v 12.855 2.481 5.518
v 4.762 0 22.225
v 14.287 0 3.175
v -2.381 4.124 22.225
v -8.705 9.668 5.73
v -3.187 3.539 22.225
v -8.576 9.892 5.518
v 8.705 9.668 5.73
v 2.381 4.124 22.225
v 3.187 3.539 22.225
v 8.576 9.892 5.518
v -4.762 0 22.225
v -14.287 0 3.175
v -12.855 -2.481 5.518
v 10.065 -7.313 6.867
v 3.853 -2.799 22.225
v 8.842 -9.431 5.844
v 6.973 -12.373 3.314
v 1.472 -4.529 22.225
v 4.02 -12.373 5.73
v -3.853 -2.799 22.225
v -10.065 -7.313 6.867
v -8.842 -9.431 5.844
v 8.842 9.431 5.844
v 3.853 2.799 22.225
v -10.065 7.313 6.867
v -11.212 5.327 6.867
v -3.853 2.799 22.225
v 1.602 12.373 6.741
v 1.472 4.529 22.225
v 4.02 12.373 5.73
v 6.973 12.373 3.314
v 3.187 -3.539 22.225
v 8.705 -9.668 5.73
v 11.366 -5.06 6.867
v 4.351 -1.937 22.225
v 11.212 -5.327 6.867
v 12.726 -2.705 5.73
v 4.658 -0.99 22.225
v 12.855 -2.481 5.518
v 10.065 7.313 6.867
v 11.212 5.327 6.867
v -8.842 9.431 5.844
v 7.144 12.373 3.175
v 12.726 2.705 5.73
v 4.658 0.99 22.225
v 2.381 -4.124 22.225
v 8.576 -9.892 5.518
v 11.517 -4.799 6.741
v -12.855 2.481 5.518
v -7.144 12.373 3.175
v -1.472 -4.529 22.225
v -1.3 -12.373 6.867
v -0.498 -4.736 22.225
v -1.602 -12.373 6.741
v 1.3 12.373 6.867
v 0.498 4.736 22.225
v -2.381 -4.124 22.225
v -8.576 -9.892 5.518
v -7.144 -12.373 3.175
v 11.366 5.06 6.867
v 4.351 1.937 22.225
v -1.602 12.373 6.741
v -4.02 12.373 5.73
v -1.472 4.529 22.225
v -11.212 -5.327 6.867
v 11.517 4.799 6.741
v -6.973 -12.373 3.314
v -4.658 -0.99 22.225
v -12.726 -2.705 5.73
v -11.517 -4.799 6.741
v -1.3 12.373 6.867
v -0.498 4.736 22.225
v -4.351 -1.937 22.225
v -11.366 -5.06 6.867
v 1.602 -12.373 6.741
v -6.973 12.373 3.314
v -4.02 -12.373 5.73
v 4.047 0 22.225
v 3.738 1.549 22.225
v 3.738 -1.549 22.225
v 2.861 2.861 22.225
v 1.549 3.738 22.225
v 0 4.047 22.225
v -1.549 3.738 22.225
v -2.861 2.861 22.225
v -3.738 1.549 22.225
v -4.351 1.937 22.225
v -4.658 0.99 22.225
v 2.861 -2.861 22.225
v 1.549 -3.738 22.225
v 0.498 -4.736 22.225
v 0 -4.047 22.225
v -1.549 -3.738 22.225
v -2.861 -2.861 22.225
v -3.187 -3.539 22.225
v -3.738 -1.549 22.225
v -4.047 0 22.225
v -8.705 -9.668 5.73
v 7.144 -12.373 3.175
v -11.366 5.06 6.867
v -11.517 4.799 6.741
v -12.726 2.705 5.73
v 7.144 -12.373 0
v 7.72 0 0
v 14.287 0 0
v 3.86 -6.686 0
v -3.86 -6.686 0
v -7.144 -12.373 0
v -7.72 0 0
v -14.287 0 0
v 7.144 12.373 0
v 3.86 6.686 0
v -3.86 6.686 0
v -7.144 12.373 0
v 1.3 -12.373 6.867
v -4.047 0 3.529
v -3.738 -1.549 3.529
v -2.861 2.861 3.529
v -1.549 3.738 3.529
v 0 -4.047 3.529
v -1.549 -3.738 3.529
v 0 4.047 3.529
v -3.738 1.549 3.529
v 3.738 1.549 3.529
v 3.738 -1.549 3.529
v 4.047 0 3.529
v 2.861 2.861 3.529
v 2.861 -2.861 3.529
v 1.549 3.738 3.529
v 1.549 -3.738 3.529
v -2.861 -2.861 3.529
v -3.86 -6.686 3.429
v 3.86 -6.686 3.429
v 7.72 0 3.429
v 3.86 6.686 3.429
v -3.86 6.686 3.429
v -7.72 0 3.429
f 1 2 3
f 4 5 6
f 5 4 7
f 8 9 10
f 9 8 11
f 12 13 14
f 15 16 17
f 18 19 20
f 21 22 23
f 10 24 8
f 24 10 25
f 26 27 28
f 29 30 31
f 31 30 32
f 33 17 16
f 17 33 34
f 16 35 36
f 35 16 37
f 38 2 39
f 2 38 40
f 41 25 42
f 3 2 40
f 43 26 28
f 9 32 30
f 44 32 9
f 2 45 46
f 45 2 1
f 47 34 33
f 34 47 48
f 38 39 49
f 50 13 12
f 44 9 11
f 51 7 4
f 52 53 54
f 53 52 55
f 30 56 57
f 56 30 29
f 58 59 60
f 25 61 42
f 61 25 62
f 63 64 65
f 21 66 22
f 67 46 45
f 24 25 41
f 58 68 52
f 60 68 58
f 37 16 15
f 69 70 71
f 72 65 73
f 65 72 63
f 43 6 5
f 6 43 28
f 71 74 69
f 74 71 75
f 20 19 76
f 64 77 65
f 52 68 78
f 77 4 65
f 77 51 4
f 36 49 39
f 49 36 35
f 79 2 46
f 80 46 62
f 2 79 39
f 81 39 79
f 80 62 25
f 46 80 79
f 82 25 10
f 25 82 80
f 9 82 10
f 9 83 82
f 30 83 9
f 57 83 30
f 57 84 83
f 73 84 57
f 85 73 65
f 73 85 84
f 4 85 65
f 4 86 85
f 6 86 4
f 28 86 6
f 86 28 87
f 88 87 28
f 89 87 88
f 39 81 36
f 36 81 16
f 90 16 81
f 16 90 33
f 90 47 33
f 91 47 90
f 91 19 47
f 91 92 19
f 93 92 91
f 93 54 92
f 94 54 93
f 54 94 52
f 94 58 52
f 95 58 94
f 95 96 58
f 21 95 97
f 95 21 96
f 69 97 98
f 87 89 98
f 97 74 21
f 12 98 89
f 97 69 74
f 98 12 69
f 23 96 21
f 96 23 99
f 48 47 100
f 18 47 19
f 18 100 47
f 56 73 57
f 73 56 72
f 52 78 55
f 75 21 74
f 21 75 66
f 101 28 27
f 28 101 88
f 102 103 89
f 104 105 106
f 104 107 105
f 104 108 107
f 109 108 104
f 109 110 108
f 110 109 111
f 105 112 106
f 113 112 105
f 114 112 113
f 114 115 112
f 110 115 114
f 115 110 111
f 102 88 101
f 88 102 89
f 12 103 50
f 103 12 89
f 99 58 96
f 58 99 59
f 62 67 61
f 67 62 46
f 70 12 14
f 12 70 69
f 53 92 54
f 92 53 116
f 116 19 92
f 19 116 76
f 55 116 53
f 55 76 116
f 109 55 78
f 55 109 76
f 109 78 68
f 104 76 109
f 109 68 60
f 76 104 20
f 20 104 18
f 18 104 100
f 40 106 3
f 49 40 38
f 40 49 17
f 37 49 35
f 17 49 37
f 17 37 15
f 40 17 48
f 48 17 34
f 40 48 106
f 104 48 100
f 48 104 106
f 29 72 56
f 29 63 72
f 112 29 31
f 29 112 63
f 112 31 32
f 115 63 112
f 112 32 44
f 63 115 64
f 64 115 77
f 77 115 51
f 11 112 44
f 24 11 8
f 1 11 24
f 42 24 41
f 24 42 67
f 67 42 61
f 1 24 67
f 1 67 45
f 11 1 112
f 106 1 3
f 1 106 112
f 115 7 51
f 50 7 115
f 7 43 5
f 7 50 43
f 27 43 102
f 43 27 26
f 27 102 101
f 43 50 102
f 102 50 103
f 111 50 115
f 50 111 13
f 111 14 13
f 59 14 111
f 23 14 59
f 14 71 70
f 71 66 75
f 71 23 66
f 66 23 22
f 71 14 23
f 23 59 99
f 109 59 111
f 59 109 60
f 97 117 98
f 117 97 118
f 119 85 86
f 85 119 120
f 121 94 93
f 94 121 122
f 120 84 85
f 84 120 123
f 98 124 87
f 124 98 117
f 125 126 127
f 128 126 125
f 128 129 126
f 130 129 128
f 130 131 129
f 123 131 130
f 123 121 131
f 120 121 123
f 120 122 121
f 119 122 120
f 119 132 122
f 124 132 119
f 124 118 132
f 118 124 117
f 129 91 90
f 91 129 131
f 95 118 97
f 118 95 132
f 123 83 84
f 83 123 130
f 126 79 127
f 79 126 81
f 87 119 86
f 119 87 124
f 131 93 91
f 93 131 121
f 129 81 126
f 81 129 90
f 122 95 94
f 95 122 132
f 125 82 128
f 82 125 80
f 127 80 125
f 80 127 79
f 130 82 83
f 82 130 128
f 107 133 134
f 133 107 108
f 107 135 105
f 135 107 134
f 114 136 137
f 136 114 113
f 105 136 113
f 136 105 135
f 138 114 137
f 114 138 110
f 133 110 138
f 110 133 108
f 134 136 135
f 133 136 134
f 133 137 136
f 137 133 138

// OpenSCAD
// file: nut.scad
use <polyhole.scad>;

inch = 25.4;

//         ID         Thick     Width
sae5f16 = [5/16*inch, .27*inch, .492*inch];

module nut(n, center = false) {
	color([.6, .6, .6])
	difference() {
		cylinder(h = n[1], r = n[2]/sqrt(3), center = center, $fn = 6);
		translate([0, 0, -n[1]])
		polyhole(h = 4*n[1], d = n[0]);
	}
}
// file: polyhole.scad
module polyhole(h, d) {
    n = max(round(2 * d),3);
    rotate([0,0,180])
        cylinder(h = h, r = (d / 2) / cos (180 / n), $fn = n);
}
// main file
include <polyhole.scad>;
include <nut.scad>;

inch = 25.4;

module cone_bushing(h = 7/8*inch, r1 = 5/8*inch, r2 = 3/16*inch,
                    hr = 9/16*inch, n = sae5f16) {
	color([.3, .5, .9])
	difference() {
		intersection() {
			cylinder(h = h, r1 = r1, r2 = r2);

			cylinder(h = h, r = hr, $fn = 6);
		}

		translate([0, 0, n[1]/2 + .1])
		polyhole(h = h, d = n[0]);

		translate([0, 0, -.1])
		cylinder(h = n[1]/2 + .1, r = 1.07*n[2]/sqrt(3), $fn = 6);
	}
}

cone_bushing();
